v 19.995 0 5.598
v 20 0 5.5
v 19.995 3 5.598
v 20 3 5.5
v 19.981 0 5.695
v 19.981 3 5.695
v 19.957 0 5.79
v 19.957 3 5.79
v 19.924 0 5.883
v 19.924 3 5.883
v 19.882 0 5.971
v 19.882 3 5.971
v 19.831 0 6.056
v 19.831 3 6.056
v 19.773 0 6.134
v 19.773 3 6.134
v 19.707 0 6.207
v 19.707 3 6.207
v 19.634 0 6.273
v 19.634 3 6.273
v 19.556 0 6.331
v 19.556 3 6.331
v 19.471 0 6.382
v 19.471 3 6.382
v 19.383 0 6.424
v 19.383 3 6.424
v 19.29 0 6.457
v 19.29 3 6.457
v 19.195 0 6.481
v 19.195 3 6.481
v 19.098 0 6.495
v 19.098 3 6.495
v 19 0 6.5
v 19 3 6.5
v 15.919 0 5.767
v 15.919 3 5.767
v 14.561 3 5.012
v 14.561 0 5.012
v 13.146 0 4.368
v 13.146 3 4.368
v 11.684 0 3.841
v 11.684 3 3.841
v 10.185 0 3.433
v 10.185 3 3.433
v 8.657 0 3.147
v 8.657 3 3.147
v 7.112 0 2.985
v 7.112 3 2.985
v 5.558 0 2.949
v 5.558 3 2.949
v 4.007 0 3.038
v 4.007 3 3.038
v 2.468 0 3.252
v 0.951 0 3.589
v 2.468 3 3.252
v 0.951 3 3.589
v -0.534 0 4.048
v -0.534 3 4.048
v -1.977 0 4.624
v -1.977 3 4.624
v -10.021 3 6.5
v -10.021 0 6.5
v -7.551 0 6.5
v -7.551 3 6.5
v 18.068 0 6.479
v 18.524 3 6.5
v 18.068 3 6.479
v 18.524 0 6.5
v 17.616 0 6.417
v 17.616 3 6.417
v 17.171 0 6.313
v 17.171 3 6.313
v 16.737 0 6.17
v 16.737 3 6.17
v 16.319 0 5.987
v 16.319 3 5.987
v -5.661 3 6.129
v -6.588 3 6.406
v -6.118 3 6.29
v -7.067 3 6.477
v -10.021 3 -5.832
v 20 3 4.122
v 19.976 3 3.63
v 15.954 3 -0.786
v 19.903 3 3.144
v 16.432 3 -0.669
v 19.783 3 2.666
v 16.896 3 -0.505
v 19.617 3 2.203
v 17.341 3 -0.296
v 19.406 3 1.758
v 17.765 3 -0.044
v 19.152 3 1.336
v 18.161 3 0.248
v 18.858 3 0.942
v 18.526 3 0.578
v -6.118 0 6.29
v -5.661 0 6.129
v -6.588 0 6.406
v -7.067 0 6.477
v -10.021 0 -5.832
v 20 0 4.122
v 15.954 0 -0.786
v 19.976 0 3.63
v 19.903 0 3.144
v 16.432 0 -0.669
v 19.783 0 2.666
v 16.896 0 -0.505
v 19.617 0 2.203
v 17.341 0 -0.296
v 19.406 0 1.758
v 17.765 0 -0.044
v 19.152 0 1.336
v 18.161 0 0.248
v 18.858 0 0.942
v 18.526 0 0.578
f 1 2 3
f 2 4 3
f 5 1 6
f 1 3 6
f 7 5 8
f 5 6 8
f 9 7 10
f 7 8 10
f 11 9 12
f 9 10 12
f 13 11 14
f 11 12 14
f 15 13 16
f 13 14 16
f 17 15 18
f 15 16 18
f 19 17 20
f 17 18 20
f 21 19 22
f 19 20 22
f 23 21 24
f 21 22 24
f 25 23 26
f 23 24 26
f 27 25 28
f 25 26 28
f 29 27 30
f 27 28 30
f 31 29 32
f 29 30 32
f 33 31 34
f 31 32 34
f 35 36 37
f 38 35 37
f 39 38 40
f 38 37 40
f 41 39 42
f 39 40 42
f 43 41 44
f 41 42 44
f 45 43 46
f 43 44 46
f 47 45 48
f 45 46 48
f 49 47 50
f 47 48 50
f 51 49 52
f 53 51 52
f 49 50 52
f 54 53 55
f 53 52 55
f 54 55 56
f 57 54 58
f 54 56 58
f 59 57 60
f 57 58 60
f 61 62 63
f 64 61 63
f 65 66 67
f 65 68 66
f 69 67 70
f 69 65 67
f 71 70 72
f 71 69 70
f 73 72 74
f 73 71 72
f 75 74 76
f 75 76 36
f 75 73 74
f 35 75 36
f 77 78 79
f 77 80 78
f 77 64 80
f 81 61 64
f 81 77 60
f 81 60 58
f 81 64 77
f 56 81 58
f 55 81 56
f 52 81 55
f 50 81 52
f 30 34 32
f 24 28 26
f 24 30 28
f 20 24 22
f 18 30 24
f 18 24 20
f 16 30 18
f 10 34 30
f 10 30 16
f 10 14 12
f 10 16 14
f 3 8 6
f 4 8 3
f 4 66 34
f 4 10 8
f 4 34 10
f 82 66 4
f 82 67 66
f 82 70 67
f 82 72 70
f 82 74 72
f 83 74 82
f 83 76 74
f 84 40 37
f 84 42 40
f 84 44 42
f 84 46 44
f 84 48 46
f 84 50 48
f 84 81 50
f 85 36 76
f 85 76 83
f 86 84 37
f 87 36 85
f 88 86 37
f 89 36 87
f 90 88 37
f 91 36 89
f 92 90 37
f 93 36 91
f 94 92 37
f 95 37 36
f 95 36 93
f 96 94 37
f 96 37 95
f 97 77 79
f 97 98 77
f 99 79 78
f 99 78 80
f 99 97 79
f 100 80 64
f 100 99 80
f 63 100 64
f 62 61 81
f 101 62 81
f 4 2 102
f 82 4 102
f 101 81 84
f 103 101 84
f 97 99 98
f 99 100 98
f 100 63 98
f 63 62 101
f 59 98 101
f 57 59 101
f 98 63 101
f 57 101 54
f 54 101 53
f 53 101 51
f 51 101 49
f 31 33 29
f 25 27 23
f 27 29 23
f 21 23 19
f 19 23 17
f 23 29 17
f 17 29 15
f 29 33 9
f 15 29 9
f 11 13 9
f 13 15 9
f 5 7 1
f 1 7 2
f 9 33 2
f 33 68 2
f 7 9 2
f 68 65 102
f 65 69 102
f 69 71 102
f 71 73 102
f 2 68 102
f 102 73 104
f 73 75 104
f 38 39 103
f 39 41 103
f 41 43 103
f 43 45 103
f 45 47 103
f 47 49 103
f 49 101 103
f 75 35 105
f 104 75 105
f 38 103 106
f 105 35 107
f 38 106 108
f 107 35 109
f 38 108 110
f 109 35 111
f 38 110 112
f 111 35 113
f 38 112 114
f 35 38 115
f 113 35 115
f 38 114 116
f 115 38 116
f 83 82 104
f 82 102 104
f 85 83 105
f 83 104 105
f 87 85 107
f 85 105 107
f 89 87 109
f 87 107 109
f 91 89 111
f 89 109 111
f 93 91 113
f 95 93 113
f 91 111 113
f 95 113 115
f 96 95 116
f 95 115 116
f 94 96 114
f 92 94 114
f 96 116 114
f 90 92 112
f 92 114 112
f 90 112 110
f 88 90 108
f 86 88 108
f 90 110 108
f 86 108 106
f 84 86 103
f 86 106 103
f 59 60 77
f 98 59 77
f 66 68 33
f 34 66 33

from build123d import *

# Parameters (mm, degrees)
SKETCH1_W           = 40
SKETCH1_H           = 13
BOSS_EXTRUDE1_DEPTH = 3
SKETCH3_R           = 1.25
CUT_EXTRUDE2_DEPTH  = 22.242645786
CUT_EXTRUDE3_DEPTH  = 10
FILLET2_R           = 5
FILLET3_R           = 1
FILLET4_R           = 5
FILLET5_R           = 5
SKETCH6_W           = 15.217676948
SKETCH6_H           = 27.138085695
CUT_EXTRUDE5_DEPTH  = 10


with BuildPart() as part:
    # Sketch1 → Boss-Extrude1 (new body)
    with BuildSketch(Plane(origin=(0, 0, 0), x_dir=(1, 0, 0), z_dir=(0, 1, 0))):
        Rectangle(SKETCH1_W, SKETCH1_H)
    extrude(amount=BOSS_EXTRUDE1_DEPTH)

    # Sketch3 → Cut-Extrude2 (cut, through all)
    with BuildSketch(Plane(origin=(0, 3, 0), x_dir=(1, 0, 0), z_dir=(0, 1, 0))):
        with Locations(Location((-17, 4, 0), (0, 0, 270))):
            Circle(SKETCH3_R)
        with Locations(Location((-17, -4, 0), (0, 0, 270))):
            Circle(SKETCH3_R)
    extrude(amount=-CUT_EXTRUDE2_DEPTH, mode=Mode.SUBTRACT)

    # Sketch5 → Cut-Extrude3 (cut)
    with BuildSketch(Plane(origin=(0, 3, 0), x_dir=(1, 0, 0), z_dir=(0, 1, 0))):
        with BuildLine():
            Line((-13.458222524, 6.5), (20, 0))
            Line((20, 0), (20, -6.5))
            Line((20, -6.5), (17.030073052, -6.5))
            ThreePointArc((17.030073052, -6.5), (7.775356774, -3.039372162), (-1.977274399, -4.624270773))
            Line((-1.977274399, -4.624270773), (-6.569653649, -6.5))
            Line((-6.569653649, -6.5), (-13.458222524, -6.5))
            Line((-13.458222524, -6.5), (-13.458222524, -10.237178745))
            Line((-13.458222524, -10.237178745), (26.023482417, -9.726914384))
            Line((26.023482417, -9.726914384), (26.023482417, 8.477274399))
            Line((26.023482417, 8.477274399), (-13.458222524, 8.477274399))
            Line((-13.458222524, 8.477274399), (-13.458222524, 6.5))
        make_face()
    extrude(amount=-CUT_EXTRUDE3_DEPTH, mode=Mode.SUBTRACT)

    # Fillet2
    fillet2_edges = [part.edges().sort_by_distance(p)[0] for p in [
        (-6.569653649, 1.5, 6.5),
        (-1.977274399, 1.5, 4.624270773),
        (17.030073052, 1.5, 6.5),
    ]]
    fillet(fillet2_edges, radius=FILLET2_R)

    # Fillet3
    fillet3_edges = [part.edges().sort_by_distance(p)[0] for p in [
        (20, 1.5, 6.5),
    ]]
    fillet(fillet3_edges, radius=FILLET3_R)

    # Fillet4
    fillet4_edges = [part.edges().sort_by_distance(p)[0] for p in [
        (20, 1.5, 0),
    ]]
    fillet(fillet4_edges, radius=FILLET4_R)

    # Fillet5
    fillet5_edges = [part.edges().sort_by_distance(p)[0] for p in [
        (-13.458222524, 1.5, -6.5),
    ]]
    fillet(fillet5_edges, radius=FILLET5_R)

    # Sketch6 → Cut-Extrude5 (cut)
    with BuildSketch(Plane(origin=(0, 3, 0), x_dir=(1, 0, 0), z_dir=(0, 1, 0))):
        with Locations((-17.629495701, -0.689660295)):
            Rectangle(SKETCH6_W, SKETCH6_H)
    extrude(amount=-CUT_EXTRUDE5_DEPTH, mode=Mode.SUBTRACT)


solid = part.part
